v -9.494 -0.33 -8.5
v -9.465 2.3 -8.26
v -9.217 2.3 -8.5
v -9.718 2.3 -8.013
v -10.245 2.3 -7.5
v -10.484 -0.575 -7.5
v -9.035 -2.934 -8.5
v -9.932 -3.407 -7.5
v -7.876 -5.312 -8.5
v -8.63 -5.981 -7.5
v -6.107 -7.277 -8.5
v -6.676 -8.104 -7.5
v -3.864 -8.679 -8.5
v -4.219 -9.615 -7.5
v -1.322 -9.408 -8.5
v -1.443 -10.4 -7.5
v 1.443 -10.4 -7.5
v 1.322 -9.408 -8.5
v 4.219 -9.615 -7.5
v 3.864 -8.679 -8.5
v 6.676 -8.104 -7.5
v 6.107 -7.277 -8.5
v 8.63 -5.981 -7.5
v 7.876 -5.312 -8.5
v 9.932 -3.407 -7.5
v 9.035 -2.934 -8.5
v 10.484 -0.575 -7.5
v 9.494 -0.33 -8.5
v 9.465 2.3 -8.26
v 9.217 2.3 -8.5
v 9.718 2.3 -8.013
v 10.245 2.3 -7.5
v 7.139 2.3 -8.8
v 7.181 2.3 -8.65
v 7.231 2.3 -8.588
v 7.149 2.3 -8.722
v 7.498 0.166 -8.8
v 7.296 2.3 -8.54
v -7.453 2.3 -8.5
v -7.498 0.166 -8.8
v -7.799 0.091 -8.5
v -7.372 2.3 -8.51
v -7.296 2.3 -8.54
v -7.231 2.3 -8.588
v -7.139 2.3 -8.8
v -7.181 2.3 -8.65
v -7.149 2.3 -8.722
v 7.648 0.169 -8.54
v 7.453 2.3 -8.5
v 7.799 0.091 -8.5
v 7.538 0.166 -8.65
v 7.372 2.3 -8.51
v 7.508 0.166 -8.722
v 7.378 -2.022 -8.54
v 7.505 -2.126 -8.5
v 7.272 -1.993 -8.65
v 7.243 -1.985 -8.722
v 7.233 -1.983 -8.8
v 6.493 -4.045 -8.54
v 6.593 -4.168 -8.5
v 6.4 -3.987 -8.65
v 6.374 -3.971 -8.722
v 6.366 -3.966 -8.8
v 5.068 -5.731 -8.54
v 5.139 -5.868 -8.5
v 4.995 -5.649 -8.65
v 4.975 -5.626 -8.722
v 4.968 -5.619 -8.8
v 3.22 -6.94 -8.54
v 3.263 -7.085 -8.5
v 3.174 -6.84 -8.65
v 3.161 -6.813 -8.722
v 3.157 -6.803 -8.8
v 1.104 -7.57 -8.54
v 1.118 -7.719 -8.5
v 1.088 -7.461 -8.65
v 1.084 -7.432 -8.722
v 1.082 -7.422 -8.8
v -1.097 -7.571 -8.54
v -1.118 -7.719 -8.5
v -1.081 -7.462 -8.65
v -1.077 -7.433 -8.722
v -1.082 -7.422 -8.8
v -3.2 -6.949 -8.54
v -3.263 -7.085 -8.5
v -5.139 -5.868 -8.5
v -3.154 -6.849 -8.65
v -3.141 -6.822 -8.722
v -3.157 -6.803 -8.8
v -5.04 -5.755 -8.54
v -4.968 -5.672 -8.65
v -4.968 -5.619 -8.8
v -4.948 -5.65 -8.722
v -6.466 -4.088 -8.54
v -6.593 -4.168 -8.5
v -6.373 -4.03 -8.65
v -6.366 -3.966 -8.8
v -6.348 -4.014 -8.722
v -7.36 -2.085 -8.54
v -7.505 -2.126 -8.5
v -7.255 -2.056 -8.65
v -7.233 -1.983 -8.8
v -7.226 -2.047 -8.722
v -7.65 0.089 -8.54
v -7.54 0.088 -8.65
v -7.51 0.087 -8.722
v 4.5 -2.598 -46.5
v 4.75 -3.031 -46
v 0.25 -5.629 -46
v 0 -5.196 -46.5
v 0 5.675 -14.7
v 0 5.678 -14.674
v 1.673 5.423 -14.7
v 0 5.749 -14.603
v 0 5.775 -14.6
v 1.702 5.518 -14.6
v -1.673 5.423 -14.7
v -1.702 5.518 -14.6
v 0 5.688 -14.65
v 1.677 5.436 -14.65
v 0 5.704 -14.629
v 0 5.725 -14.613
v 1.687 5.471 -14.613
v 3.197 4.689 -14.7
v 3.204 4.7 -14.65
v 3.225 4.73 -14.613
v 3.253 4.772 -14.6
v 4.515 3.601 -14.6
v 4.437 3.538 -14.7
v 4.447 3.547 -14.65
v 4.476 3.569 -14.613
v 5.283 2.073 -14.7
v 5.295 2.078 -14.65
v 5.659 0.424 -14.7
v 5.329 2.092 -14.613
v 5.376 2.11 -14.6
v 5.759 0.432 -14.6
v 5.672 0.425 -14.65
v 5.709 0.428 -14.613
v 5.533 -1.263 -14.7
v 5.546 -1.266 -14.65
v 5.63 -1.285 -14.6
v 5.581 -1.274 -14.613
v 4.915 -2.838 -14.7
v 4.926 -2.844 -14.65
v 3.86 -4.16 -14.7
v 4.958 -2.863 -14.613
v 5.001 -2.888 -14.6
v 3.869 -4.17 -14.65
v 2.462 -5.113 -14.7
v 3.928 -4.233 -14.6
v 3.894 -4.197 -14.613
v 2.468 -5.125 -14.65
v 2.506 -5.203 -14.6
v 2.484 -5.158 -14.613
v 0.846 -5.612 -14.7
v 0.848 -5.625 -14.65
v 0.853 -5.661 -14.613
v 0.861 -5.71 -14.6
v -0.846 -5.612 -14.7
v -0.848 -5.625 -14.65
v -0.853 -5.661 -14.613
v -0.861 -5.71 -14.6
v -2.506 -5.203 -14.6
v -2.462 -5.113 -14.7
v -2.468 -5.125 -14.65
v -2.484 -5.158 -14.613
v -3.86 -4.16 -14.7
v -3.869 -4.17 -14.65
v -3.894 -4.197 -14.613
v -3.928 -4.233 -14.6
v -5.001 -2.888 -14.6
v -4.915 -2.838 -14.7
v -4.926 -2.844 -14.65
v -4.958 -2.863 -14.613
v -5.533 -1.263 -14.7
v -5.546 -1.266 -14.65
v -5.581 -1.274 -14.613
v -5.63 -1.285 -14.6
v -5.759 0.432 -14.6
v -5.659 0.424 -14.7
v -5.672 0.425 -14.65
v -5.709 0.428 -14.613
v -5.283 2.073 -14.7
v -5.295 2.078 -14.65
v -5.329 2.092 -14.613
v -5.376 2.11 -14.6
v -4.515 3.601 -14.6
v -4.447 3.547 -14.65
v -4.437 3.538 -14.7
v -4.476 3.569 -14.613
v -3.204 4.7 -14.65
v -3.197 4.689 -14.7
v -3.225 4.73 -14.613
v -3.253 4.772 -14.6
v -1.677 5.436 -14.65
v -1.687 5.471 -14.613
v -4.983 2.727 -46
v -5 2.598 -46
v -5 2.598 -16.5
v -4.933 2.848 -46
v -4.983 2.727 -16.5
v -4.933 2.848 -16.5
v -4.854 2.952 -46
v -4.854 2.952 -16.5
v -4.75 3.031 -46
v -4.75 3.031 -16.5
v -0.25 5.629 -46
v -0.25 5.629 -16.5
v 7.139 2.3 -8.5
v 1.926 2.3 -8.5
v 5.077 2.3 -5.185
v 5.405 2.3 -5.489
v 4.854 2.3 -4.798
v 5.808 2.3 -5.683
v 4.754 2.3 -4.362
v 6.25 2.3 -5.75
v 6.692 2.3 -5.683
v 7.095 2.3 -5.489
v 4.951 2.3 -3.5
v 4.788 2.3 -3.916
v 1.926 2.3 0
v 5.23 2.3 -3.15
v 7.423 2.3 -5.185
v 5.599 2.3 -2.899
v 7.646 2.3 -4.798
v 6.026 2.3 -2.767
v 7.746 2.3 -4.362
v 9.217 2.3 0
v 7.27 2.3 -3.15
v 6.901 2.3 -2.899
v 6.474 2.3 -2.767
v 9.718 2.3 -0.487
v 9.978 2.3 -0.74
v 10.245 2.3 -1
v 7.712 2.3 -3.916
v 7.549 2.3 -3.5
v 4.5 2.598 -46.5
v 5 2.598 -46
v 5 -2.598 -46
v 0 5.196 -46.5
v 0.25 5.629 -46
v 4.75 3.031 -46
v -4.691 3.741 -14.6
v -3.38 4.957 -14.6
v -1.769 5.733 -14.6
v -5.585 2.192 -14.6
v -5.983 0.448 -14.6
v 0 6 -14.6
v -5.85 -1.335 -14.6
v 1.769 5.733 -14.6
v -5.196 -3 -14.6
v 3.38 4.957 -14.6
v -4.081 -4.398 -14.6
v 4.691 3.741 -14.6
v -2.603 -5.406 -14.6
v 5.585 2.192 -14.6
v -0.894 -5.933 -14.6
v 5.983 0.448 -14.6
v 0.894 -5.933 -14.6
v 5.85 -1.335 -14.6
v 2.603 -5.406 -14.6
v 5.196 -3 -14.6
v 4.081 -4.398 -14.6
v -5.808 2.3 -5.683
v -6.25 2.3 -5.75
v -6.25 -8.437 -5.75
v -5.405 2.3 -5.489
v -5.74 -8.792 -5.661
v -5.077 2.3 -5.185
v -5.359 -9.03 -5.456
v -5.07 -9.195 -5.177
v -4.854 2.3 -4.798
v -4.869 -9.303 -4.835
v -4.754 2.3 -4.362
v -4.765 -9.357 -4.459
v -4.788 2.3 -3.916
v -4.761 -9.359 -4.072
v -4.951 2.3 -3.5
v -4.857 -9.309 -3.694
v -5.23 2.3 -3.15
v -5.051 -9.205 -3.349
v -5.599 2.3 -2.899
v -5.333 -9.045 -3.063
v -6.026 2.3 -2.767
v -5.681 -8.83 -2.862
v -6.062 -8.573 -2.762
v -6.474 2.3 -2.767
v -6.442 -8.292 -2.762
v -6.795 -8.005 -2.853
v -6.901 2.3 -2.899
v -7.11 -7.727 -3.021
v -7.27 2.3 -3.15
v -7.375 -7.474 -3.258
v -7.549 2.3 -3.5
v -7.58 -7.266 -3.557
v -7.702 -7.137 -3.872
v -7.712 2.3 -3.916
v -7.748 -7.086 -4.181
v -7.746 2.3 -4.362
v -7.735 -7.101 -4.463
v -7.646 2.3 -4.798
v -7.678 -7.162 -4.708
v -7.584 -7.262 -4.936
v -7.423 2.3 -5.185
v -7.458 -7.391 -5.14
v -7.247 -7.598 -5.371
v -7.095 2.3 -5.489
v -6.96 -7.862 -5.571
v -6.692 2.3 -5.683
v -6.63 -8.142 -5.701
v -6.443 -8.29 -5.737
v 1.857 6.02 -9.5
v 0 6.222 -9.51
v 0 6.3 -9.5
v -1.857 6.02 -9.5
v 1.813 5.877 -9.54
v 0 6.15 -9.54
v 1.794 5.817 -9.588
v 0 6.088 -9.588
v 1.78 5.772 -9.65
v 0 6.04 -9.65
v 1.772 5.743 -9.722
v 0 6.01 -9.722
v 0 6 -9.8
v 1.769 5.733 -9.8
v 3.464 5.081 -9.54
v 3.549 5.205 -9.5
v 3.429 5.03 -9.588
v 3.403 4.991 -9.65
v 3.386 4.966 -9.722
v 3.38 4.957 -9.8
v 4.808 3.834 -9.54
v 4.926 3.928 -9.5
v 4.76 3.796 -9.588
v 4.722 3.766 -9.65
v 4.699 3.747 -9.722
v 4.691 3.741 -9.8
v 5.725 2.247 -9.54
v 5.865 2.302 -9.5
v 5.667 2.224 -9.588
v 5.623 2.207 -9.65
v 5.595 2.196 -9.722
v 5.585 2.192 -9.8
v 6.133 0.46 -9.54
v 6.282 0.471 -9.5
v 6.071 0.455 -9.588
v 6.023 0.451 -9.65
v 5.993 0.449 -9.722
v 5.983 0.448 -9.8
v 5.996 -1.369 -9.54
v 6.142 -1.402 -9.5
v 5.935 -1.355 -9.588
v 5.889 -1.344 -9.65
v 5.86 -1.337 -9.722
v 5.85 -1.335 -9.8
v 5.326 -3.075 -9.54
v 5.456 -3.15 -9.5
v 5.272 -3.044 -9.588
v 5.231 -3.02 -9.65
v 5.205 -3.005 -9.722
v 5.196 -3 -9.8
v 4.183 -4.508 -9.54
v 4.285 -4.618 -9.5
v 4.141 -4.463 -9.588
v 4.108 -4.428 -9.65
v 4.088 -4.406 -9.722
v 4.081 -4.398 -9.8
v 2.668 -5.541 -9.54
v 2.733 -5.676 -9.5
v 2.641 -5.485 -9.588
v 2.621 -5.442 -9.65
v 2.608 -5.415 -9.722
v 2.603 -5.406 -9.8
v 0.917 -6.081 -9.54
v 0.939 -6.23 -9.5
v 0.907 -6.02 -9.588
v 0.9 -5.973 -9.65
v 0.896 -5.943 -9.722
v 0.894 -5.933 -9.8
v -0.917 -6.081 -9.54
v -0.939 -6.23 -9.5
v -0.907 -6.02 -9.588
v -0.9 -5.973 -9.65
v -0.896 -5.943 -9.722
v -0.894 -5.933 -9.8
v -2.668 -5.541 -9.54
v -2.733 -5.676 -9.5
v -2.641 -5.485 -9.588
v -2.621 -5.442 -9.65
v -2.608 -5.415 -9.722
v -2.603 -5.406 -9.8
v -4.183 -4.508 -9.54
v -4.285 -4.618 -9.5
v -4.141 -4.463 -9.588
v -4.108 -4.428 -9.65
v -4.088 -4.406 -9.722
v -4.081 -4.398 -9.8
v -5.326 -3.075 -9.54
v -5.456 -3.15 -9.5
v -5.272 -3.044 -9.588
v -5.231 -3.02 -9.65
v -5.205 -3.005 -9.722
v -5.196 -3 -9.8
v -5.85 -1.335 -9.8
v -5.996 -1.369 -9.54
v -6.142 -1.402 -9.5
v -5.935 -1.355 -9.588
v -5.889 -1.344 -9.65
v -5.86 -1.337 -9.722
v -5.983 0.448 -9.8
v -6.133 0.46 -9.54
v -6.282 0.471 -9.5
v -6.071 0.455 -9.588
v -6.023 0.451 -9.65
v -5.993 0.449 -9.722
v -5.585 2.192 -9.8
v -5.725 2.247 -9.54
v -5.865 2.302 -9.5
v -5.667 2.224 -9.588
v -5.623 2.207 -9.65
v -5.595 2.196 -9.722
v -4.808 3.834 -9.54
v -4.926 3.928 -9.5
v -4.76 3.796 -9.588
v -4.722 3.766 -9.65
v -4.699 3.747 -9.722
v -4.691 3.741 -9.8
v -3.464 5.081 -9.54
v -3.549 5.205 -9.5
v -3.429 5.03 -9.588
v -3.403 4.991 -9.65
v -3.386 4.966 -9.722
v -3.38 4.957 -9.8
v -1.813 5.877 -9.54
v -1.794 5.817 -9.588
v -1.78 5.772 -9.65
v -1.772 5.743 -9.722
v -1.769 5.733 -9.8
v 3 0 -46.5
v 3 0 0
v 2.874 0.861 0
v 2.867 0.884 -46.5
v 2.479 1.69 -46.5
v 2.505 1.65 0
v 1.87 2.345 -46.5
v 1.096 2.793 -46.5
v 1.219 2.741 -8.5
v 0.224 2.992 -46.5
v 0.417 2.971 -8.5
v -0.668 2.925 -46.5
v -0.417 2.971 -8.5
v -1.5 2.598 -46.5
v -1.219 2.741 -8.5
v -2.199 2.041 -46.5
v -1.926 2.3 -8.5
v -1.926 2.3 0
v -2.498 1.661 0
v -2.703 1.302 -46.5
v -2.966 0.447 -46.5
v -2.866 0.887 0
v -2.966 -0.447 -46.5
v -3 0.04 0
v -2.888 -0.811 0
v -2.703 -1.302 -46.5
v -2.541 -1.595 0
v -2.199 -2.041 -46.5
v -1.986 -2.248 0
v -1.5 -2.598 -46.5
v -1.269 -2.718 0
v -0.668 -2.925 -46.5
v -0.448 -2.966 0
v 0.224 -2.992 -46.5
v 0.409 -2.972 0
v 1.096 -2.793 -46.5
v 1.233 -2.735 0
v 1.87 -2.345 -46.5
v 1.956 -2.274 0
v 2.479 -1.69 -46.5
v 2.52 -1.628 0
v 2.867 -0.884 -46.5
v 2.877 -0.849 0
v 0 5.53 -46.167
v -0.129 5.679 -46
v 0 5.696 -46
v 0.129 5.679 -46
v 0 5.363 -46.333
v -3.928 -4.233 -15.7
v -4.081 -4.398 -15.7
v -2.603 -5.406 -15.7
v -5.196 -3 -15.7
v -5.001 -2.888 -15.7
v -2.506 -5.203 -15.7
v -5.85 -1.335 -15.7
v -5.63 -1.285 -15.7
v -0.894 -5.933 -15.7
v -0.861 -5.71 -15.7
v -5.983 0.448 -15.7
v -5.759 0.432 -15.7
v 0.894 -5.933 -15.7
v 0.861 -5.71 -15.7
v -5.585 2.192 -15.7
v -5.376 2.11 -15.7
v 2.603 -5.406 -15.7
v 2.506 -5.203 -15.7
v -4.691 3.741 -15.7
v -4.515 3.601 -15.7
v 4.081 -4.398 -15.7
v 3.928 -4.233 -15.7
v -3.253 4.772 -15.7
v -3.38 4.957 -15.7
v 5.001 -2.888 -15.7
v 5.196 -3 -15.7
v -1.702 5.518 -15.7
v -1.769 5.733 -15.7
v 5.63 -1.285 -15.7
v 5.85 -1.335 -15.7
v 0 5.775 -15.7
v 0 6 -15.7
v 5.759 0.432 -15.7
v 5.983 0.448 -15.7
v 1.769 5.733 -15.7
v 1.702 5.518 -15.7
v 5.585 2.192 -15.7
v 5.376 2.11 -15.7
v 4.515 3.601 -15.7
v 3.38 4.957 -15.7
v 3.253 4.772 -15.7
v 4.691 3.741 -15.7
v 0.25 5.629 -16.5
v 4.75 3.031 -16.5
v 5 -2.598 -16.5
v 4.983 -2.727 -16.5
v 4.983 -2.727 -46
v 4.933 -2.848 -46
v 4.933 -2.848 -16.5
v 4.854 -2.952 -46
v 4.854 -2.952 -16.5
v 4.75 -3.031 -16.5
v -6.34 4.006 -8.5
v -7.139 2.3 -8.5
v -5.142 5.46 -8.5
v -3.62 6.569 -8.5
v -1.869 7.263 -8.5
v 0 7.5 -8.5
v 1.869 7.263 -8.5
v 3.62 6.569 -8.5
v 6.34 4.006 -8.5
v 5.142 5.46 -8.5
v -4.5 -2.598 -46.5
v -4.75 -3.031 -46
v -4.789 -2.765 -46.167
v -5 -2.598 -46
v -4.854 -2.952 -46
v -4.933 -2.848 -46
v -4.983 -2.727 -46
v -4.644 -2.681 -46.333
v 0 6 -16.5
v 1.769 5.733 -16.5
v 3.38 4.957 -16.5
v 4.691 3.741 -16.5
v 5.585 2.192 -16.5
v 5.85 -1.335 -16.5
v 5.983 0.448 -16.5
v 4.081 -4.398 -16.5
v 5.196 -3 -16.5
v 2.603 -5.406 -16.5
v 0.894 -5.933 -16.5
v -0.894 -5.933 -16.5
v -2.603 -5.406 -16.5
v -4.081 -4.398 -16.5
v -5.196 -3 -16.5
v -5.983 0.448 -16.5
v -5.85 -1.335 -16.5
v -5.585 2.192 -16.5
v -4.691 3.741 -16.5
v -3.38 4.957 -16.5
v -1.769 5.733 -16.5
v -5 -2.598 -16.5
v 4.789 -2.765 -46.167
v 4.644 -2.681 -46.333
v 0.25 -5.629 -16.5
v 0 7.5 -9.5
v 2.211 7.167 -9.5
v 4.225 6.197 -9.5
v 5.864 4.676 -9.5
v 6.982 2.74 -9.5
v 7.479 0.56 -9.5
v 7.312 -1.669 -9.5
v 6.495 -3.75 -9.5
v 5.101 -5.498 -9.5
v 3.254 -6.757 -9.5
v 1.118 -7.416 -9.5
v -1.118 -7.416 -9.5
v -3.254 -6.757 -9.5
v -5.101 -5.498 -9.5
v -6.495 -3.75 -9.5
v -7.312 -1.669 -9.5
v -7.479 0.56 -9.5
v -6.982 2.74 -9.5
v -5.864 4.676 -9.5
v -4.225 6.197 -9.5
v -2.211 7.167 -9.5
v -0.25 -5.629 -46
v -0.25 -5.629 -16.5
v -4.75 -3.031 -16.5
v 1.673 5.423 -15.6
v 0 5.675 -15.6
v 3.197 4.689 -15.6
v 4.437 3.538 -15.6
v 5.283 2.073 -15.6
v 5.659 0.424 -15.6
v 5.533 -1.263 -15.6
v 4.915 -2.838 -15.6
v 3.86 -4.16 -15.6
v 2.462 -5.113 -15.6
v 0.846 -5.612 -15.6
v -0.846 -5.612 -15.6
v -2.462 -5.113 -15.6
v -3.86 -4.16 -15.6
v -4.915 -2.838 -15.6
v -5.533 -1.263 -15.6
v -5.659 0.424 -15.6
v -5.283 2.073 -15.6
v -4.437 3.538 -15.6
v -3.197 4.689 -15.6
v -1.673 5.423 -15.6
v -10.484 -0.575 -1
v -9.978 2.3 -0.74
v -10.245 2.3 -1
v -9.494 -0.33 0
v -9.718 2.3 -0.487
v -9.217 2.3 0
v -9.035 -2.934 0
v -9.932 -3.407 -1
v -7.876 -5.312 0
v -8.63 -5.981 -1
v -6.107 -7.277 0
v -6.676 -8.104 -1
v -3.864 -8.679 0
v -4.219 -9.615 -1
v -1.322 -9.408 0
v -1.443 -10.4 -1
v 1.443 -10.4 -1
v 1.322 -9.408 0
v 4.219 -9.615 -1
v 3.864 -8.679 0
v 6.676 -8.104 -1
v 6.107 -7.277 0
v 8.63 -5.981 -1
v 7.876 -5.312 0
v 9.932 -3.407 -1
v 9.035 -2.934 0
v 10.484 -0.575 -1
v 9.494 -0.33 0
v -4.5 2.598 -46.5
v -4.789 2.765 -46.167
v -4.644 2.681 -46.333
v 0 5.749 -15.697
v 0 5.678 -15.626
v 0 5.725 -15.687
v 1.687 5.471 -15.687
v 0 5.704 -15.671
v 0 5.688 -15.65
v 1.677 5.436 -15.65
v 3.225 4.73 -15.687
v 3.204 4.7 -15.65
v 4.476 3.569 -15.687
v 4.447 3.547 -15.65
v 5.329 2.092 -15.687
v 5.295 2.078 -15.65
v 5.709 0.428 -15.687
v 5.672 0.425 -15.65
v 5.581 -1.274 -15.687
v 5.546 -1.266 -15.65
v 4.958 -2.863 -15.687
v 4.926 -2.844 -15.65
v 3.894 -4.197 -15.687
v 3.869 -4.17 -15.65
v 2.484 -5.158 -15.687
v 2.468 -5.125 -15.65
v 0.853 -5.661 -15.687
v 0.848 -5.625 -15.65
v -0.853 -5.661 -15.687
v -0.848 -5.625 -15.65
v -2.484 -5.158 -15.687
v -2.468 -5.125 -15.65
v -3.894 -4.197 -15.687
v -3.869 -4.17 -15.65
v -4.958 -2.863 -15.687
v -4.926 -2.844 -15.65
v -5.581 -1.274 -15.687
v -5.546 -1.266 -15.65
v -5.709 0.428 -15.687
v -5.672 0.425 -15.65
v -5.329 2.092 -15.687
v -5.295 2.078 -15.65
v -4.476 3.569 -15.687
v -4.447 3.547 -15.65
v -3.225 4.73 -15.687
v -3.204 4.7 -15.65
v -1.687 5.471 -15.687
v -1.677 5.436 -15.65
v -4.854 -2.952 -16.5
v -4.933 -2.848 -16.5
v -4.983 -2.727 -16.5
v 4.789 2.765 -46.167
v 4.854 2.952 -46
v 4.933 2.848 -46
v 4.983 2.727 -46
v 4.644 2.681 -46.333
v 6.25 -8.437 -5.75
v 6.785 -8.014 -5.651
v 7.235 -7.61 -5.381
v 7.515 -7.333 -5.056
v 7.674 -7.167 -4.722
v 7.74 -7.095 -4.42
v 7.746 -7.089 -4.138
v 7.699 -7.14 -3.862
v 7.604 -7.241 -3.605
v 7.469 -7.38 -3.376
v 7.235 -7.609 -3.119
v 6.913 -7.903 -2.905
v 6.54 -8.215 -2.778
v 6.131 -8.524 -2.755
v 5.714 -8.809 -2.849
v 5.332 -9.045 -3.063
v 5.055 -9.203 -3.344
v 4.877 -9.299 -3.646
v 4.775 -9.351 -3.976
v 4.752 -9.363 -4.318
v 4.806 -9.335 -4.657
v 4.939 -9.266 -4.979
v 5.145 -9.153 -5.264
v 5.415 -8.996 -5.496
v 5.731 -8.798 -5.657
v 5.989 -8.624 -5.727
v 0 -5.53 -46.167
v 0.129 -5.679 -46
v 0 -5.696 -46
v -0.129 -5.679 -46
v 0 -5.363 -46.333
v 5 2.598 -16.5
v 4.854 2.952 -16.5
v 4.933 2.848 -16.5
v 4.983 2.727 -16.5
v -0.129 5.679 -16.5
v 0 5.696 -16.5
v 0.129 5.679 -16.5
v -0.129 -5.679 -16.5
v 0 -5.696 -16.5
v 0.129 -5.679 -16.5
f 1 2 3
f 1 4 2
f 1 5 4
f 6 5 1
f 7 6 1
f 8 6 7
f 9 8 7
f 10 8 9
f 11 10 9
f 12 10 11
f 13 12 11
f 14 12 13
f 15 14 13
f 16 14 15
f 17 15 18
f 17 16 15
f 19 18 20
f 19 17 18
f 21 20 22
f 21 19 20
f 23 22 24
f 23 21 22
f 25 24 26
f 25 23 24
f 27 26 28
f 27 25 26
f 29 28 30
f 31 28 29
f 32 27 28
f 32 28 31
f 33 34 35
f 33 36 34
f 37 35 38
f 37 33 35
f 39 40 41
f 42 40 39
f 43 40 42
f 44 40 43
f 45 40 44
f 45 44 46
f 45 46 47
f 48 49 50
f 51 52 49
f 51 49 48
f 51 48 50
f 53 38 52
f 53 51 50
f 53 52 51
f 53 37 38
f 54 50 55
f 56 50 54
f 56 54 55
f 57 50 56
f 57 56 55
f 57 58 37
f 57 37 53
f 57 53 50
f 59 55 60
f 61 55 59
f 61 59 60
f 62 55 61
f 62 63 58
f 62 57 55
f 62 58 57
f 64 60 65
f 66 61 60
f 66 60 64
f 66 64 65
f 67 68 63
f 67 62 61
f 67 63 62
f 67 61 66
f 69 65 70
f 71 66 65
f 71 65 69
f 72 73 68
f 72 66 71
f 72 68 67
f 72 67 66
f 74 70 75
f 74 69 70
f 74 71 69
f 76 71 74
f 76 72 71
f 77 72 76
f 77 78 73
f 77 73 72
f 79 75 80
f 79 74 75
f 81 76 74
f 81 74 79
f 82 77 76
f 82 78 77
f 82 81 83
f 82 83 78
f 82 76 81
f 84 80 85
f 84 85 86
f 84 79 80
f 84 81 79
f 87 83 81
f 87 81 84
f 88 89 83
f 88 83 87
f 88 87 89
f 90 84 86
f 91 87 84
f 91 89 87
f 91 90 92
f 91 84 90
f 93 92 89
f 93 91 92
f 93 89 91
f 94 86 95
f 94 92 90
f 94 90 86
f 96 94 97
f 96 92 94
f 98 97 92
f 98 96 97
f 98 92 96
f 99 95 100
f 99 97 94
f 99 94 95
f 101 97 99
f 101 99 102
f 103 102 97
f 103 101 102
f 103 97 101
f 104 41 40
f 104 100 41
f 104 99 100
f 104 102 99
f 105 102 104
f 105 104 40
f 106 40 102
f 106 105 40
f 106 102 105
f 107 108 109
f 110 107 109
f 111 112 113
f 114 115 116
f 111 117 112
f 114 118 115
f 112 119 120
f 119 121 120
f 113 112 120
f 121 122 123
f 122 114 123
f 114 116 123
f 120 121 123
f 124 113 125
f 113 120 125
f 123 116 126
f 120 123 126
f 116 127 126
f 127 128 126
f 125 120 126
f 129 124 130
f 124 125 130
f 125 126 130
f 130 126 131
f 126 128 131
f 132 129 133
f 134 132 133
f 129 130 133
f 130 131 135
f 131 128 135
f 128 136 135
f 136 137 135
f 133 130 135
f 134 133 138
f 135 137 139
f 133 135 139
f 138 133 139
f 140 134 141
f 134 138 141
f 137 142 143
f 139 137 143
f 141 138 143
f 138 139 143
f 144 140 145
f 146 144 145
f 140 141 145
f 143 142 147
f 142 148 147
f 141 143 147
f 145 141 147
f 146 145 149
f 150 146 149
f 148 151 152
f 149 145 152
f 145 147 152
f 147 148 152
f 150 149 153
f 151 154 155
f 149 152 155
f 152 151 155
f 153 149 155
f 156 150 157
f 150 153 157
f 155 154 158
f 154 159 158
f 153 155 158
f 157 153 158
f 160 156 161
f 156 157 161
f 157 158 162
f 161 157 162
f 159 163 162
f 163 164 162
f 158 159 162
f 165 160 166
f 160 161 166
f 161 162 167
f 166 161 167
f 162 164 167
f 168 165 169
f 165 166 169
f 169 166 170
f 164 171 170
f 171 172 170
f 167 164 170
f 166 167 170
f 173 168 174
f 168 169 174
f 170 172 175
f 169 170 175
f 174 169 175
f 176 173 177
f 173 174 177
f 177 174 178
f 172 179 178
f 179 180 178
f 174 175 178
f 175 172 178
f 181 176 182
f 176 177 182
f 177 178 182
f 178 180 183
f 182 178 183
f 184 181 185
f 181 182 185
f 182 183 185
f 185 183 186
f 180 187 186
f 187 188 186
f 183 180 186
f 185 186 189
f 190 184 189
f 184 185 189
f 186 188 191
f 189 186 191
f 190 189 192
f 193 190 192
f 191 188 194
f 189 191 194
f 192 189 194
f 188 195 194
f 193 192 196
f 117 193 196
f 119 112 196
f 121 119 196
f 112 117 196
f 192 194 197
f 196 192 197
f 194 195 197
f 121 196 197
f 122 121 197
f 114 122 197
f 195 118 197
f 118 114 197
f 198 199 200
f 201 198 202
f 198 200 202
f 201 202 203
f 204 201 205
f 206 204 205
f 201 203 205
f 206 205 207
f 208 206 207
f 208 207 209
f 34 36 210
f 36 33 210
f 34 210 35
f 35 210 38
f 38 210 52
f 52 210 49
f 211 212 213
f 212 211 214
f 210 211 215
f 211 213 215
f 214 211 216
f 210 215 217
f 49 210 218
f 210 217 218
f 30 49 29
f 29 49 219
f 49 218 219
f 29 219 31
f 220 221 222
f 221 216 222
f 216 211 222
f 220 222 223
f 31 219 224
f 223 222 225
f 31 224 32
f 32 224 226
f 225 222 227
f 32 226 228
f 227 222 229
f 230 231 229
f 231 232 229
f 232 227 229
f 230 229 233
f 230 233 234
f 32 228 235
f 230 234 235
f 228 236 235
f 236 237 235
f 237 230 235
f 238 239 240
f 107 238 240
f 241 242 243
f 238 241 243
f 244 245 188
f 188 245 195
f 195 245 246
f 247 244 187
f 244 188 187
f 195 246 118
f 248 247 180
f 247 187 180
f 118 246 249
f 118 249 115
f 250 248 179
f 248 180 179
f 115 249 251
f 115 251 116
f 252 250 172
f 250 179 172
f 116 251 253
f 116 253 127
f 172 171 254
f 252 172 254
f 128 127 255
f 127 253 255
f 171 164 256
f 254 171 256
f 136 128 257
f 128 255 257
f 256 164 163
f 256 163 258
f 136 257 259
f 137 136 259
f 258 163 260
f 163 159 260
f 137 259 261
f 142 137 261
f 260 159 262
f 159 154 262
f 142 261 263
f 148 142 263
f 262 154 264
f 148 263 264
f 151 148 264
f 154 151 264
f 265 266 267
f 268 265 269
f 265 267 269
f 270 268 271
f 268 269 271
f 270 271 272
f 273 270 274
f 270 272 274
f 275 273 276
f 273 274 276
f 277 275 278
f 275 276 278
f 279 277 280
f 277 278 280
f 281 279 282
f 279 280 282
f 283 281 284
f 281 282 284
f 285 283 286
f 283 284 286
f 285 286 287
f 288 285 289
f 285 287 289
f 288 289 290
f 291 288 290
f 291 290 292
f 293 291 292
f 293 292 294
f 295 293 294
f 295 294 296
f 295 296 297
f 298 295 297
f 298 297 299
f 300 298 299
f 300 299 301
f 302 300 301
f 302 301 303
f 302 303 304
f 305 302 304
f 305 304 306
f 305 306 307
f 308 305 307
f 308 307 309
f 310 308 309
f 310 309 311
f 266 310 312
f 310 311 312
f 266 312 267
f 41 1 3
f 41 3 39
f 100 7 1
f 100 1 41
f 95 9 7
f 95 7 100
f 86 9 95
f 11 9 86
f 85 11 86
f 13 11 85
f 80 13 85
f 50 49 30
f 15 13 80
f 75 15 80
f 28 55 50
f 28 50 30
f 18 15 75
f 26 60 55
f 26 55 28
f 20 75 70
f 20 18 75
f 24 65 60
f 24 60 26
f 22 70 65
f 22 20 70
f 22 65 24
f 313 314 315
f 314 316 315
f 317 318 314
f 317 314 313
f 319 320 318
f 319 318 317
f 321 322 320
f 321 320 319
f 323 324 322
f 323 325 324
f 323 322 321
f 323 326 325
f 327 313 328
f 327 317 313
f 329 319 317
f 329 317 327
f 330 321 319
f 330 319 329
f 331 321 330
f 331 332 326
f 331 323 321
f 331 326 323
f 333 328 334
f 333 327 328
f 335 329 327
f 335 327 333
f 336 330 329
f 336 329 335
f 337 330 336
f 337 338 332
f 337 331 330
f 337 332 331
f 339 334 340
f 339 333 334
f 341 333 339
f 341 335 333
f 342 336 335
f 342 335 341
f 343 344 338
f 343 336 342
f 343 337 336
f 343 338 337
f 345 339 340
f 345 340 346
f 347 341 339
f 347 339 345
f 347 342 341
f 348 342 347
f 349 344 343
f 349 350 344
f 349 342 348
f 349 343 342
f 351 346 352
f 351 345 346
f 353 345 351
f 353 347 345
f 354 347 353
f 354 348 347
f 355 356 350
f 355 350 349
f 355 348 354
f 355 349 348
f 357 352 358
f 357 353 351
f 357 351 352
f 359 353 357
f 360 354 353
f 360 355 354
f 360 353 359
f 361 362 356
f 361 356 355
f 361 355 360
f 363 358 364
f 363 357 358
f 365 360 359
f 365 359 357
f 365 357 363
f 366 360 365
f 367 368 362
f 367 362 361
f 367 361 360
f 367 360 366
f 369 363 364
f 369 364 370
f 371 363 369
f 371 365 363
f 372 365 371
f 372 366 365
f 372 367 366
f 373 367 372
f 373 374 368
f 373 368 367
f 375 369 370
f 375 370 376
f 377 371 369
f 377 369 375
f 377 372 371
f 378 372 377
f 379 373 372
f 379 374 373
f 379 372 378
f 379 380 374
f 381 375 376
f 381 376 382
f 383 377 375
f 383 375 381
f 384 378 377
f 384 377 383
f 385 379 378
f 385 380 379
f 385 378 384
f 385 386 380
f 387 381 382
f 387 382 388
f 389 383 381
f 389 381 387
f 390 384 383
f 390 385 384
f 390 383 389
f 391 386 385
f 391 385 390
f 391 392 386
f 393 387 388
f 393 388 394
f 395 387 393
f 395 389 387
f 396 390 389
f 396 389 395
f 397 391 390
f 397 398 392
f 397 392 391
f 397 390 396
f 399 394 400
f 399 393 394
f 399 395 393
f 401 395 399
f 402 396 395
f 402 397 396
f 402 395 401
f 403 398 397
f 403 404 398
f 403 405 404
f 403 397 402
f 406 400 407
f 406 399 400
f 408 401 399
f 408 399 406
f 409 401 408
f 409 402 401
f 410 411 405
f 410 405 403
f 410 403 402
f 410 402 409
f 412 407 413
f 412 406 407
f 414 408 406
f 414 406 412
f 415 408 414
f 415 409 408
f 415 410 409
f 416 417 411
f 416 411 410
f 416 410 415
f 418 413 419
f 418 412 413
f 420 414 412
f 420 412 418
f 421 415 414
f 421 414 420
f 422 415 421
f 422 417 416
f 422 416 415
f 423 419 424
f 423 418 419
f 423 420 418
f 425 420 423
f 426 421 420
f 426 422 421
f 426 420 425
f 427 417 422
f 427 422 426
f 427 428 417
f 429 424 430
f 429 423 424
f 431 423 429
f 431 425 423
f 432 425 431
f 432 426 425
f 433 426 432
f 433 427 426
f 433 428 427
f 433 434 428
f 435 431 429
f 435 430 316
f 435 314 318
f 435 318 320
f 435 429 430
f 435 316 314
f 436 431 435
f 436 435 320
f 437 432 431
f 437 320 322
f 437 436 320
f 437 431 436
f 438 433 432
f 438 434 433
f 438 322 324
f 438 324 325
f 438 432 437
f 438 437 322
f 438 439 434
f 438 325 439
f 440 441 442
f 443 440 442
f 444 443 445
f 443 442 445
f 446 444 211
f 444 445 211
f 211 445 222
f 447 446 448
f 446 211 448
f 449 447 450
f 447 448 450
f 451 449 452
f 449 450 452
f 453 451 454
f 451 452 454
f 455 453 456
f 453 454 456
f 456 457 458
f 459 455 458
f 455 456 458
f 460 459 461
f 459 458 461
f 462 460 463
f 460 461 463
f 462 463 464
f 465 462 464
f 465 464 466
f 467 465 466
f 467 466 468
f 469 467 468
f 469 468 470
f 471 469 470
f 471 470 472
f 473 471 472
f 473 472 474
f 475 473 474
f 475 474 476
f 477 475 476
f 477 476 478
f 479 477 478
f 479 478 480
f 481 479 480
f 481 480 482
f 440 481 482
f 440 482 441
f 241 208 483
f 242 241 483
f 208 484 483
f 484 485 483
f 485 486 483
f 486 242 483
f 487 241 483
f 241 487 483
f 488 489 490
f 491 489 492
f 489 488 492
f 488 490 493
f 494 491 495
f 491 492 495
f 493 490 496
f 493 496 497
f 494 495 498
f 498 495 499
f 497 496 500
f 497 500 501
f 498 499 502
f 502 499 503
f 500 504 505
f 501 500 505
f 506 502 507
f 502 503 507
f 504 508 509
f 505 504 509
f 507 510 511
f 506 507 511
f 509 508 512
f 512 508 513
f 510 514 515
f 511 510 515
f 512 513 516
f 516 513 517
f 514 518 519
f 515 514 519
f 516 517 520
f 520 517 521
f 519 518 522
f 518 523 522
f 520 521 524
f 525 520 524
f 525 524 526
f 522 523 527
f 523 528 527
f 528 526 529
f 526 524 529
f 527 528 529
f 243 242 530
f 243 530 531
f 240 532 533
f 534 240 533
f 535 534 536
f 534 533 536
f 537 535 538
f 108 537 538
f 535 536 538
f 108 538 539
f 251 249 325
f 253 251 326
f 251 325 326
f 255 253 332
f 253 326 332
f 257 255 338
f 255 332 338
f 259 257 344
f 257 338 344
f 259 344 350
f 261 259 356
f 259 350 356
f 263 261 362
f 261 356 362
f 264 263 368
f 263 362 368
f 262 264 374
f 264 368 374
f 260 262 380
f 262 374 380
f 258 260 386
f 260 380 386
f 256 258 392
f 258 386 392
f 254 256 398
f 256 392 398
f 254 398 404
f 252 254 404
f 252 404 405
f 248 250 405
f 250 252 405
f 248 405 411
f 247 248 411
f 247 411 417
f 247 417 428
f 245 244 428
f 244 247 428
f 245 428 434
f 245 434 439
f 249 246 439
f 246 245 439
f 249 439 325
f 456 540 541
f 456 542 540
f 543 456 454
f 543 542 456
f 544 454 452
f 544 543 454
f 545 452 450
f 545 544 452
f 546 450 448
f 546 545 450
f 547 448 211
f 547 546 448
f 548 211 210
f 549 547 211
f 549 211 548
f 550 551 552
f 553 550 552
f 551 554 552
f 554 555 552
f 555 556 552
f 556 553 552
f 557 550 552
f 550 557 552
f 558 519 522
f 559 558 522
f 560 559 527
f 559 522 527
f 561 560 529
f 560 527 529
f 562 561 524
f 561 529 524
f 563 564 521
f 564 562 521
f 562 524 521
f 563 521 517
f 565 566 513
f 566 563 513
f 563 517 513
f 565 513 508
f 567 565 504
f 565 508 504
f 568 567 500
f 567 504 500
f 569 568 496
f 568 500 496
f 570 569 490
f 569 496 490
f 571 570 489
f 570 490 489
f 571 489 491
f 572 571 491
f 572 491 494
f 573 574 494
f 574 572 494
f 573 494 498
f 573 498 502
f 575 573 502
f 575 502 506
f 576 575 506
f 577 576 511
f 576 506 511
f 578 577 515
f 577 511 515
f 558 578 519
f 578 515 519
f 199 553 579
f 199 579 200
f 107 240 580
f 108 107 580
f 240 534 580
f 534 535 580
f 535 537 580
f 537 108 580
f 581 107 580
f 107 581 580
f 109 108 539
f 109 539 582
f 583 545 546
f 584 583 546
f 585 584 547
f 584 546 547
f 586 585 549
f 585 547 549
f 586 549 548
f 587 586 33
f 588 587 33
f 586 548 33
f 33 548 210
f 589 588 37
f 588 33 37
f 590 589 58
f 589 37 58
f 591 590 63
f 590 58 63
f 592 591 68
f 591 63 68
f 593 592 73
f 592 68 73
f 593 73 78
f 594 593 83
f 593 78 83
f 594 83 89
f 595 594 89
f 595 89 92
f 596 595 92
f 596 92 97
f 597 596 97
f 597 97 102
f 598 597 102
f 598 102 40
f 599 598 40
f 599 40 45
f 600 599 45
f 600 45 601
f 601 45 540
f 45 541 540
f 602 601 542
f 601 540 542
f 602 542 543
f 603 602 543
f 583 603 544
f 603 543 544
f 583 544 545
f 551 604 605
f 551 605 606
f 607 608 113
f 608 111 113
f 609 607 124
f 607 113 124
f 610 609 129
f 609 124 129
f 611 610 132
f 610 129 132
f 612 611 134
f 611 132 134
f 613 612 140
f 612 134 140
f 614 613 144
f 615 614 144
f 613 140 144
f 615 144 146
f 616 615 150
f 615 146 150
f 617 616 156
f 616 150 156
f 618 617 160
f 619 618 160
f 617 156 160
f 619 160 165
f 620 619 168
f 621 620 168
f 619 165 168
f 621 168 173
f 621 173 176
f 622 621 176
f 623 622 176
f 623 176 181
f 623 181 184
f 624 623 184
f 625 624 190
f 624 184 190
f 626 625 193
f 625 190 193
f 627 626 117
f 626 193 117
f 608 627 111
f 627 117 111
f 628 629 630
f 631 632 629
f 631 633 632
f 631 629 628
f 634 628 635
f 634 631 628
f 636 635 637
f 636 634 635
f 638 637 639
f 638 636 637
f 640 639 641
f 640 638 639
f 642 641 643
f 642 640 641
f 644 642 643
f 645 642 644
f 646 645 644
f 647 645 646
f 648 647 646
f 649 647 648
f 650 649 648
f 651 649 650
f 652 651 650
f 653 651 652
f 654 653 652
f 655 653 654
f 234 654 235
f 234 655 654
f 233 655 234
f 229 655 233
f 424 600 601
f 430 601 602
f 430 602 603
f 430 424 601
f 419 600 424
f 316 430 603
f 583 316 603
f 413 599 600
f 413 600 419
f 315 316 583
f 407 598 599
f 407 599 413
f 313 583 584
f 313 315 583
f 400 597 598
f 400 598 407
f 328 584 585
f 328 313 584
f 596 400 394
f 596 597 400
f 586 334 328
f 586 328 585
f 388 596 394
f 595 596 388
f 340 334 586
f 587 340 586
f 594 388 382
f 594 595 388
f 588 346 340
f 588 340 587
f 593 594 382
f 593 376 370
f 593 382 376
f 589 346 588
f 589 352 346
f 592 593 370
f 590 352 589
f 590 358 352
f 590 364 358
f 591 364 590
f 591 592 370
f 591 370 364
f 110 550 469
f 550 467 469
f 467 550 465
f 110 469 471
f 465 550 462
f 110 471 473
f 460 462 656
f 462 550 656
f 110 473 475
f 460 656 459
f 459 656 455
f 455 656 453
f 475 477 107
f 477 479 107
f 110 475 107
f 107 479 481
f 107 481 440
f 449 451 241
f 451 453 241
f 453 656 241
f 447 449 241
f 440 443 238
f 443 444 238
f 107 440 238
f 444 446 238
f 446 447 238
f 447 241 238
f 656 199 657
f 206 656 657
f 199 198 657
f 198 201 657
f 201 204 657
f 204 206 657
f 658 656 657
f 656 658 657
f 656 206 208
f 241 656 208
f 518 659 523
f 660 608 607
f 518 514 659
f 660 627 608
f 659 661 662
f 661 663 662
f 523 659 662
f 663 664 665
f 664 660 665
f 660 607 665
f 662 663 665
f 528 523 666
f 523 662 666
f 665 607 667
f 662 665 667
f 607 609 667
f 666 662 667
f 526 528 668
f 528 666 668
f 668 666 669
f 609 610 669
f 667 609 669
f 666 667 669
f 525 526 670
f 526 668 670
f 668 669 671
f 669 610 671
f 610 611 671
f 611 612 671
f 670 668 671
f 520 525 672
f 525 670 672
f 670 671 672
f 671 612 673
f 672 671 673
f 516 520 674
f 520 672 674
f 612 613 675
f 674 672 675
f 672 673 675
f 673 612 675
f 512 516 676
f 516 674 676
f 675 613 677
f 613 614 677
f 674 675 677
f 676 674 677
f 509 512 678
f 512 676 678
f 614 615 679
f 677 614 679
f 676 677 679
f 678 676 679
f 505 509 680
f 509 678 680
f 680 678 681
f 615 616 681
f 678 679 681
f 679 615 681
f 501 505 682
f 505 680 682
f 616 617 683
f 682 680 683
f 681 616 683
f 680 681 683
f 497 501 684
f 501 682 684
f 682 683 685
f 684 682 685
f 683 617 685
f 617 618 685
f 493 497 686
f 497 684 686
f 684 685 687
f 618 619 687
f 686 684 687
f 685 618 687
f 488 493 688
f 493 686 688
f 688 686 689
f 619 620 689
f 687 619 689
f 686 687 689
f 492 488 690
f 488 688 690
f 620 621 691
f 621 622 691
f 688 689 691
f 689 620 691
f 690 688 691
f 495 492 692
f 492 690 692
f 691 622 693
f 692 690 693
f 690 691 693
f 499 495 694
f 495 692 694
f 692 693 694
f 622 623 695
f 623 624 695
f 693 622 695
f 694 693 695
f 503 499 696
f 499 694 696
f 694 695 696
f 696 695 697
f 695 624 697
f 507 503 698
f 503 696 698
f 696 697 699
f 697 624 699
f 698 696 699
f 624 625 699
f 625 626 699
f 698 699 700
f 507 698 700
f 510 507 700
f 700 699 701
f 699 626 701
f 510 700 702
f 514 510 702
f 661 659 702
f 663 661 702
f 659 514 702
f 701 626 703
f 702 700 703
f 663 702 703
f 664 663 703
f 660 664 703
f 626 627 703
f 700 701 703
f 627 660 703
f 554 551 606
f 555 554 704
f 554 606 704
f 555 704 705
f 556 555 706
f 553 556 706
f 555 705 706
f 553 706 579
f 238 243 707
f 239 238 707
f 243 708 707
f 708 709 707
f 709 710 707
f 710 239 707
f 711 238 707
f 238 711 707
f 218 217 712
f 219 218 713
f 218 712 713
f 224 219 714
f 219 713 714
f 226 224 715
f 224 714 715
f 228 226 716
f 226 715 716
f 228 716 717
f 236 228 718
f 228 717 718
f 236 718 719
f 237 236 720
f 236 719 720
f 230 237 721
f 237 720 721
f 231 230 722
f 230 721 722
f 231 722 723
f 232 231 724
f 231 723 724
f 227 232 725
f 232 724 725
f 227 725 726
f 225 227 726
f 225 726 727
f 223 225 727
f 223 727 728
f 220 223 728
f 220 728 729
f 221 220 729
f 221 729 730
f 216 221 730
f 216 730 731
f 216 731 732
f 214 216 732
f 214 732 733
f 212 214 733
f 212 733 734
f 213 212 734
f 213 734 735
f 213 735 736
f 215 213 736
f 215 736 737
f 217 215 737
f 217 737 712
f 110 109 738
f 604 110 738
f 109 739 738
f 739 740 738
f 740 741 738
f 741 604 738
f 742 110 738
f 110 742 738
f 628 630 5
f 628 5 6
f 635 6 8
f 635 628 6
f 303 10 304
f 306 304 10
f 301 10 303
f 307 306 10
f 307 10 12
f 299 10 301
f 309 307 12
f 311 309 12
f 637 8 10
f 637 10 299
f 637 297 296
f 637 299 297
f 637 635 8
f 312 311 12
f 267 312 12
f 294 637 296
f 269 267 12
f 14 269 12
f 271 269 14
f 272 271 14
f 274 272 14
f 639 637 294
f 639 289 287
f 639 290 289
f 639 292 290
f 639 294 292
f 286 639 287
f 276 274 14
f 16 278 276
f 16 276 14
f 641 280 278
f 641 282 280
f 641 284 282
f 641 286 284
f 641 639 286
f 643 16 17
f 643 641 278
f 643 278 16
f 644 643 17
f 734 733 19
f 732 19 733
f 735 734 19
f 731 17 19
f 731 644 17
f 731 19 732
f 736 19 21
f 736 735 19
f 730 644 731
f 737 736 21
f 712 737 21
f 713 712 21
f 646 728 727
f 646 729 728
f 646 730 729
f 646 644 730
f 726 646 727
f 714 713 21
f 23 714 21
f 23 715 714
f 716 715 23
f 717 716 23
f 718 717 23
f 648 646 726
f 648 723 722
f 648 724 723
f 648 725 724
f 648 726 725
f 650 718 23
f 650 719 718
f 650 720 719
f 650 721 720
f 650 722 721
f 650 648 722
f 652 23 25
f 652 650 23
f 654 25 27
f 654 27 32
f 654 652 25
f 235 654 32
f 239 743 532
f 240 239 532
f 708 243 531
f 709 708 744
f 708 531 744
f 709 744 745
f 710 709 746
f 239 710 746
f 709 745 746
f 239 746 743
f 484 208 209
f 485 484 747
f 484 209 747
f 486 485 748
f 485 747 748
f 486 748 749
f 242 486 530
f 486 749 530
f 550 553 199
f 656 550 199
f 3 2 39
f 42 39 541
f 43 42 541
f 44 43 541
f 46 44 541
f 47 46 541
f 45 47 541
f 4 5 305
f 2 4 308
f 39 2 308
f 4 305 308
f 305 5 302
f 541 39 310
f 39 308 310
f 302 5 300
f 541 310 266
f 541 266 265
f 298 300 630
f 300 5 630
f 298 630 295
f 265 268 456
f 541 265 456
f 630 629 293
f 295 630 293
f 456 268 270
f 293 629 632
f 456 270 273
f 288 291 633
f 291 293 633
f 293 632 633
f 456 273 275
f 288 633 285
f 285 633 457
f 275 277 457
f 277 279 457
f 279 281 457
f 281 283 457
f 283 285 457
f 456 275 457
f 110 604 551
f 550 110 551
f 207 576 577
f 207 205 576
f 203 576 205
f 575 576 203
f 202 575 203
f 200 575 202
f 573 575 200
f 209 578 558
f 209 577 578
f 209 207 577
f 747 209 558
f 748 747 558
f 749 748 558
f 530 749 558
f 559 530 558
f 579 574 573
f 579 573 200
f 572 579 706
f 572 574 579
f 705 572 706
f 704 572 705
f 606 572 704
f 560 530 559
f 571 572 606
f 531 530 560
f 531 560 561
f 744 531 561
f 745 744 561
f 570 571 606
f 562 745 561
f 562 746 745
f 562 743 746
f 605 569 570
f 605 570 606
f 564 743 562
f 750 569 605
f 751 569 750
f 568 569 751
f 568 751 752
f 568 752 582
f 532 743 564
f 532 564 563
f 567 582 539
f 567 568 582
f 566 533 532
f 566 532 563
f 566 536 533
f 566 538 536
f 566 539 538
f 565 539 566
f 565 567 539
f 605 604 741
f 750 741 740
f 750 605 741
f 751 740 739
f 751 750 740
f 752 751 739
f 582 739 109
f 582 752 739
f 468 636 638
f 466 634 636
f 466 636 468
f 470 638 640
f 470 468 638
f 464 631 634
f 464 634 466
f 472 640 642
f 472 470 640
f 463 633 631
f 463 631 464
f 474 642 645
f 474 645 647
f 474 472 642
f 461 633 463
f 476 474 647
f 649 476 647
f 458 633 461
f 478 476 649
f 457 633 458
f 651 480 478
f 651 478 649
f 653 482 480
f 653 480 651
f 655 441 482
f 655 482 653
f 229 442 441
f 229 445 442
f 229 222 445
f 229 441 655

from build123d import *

# Parameters (mm, degrees)
SKETCH1_R             = 10.5
SKETCH1_R_2           = 3
EXTRUDE1_DEPTH        = 46.5
SKETCH1_3_R           = 3
CUT_EXTRUDE1_DEPTH    = 49.813420286
CUT_EXTRUDE4_DEPTH    = 8.5
CUT_EXTRUDE6_START    = -37
SKETCH6_R             = 10.5
SKETCH6_R_2           = 6
CUT_EXTRUDE6_DEPTH    = 37
CUT_EXTRUDE7_START    = -1
SKETCH7_R             = 10.5
SKETCH7_R_2           = 7.5
CUT_EXTRUDE7_DEPTH    = 1
M4X0_7_TAPPED_HOLE1_D = 3
SKETCH8_OUTSIDE_W     = 33.82
SKETCH8_OUTSIDE_H     = 30.82
CUT_EXTRUDE8_DEPTH    = 30
FILLET1_R             = 0.5
CHAMFER1_SIZE         = 0.5
FILLET2_R             = 0.3
CHAMFER2_SIZE         = 1


with BuildPart() as part:
    # Sketch1 → Extrude1 (new body)
    # profile 1 of 2: a face of its own
    with BuildSketch(Plane.XY):
        Circle(SKETCH1_R)
        Circle(SKETCH1_R_2, mode=Mode.SUBTRACT)
    # profile 2 of 2: a face of its own
    with BuildSketch(Plane.XY):
        Circle(SKETCH1_R_2)
    extrude(amount=-EXTRUDE1_DEPTH)

    # Sketch1<3> → Cut-Extrude1 (cut, through all)
    with BuildSketch(Plane.XY):
        Circle(SKETCH1_3_R)
    extrude(amount=-CUT_EXTRUDE1_DEPTH, mode=Mode.SUBTRACT)

    # Sketch4 → Cut-Extrude4 (cut)
    with BuildSketch(Plane.XY):
        with BuildLine():
            Line((-10.24499878, 2.3), (10.24499878, 2.3))
            ThreePointArc((10.24499878, 2.3), (0, 10.5), (-10.24499878, 2.3))
        make_face()
    extrude(amount=-CUT_EXTRUDE4_DEPTH, mode=Mode.SUBTRACT)

    # Sketch6 → Cut-Extrude6 (cut)
    with BuildSketch(Plane(origin=(0, 0, -46.5), x_dir=(1, 0, 0), z_dir=(0, 0, -1)).offset(CUT_EXTRUDE6_START)):
        Circle(SKETCH6_R)
        with Locations(Location((0, 0, 0), (0, 0, 270))):
            Circle(SKETCH6_R_2, mode=Mode.SUBTRACT)
    extrude(amount=CUT_EXTRUDE6_DEPTH, mode=Mode.SUBTRACT)

    # Sketch7 → Cut-Extrude7 (cut)
    with BuildSketch(Plane(origin=(0, 0, -9.5), x_dir=(1, 0, 0), z_dir=(0, 0, -1)).offset(CUT_EXTRUDE7_START)):
        Circle(SKETCH7_R)
        with Locations(Location((0, 0, 0), (0, 0, 270))):
            Circle(SKETCH7_R_2, mode=Mode.SUBTRACT)
    extrude(amount=CUT_EXTRUDE7_DEPTH, mode=Mode.SUBTRACT)

    # M4x0.7 Tapped Hole1 (through all)
    with Locations(Plane(origin=(6.25, 2.3, -4.25), x_dir=(0, 0, 1), z_dir=(0, 1, 0))):
        with Locations((0, 0), (0, -12.5)):
            Hole(M4X0_7_TAPPED_HOLE1_D / 2)

    # Sketch8 outside → Cut-Extrude8 (cut)
    with BuildSketch(Plane(origin=(0, 0, -46.5), x_dir=(1, 0, 0), z_dir=(0, 0, -1))):
        with Locations((0, 1.5)):
            Rectangle(SKETCH8_OUTSIDE_W, SKETCH8_OUTSIDE_H)
        Polygon((0, 5.773502692), (-5, 2.886751346), (-5, -2.886751346), (0, -5.773502692), (5, -2.886751346), (5, 2.886751346), align=None, mode=Mode.SUBTRACT)
    extrude(amount=-CUT_EXTRUDE8_DEPTH, mode=Mode.SUBTRACT)

    # Fillet1
    fillet1_edges = [part.edges().sort_by_distance(p)[0] for p in [
        (5, -2.886751346, -31.5),
        (5, 2.886751346, -31.5),
        (0, 5.773502692, -31.5),
        (-5, 2.886751346, -31.5),
        (-5, -2.886751346, -31.5),
        (0, -5.773502692, -31.5),
    ]]
    fillet(fillet1_edges, radius=FILLET1_R)

    # Chamfer1
    chamfer1_edges = [part.edges().sort_by_distance(p)[0] for p in [
        (-2.5, -4.330127019, -46.5),
        (2.5, -4.330127019, -46.5),
        (-5, 0, -46.5),
        (-2.5, 4.330127019, -46.5),
        (2.5, 4.330127019, -46.5),
        (5, 0, -46.5),
        (0, -5.696152423, -46.5),
        (4.933012702, -2.848076211, -46.5),
        (4.933012702, 2.848076211, -46.5),
        (0, 5.696152423, -46.5),
        (-4.933012702, 2.848076211, -46.5),
        (-4.933012702, -2.848076211, -46.5),
    ]]
    chamfer(chamfer1_edges, length=CHAMFER1_SIZE - 0.0001)  # a hair under: the kernel refuses the full size

    # Sketch12 → Groove for ANSI B27.7 - 3AM1-12, Basic External Retaining Ring1 (revolve, cut)
    with BuildSketch(Plane(origin=(0, 0, 19.370057685), x_dir=(0, 1, 0), z_dir=(-1, 0, 0))):
        with BuildLine():
            Line((5.775, 33.970057685), (7.275, 33.970057685))
            Line((7.275, 33.970057685), (7.275, 35.070057685))
            Line((7.275, 35.070057685), (5.775, 35.070057685))
            ThreePointArc((5.775, 35.070057685), (5.704289322, 35.040768363), (5.675, 34.970057685))
            Line((5.675, 34.970057685), (5.675, 34.070057685))
            ThreePointArc((5.675, 34.070057685), (5.704289322, 33.999347007), (5.775, 33.970057685))
        make_face()
    revolve(axis=Axis((0, 0, 69.359173663), (0, 0, -1)), mode=Mode.SUBTRACT)

    # Fillet2
    fillet2_edges = [part.edges().sort_by_distance(p)[0] for p in [
        (0, -6, -9.5),
        (0, -7.5, -8.5),
    ]]
    fillet(fillet2_edges, radius=FILLET2_R)

    # Chamfer2
    chamfer2_edges = [part.edges().sort_by_distance(p)[0] for p in [
        (0, -10.5, 0),
        (0, -10.5, -8.5),
    ]]
    chamfer(chamfer2_edges, length=CHAMFER2_SIZE)


solid = part.part
